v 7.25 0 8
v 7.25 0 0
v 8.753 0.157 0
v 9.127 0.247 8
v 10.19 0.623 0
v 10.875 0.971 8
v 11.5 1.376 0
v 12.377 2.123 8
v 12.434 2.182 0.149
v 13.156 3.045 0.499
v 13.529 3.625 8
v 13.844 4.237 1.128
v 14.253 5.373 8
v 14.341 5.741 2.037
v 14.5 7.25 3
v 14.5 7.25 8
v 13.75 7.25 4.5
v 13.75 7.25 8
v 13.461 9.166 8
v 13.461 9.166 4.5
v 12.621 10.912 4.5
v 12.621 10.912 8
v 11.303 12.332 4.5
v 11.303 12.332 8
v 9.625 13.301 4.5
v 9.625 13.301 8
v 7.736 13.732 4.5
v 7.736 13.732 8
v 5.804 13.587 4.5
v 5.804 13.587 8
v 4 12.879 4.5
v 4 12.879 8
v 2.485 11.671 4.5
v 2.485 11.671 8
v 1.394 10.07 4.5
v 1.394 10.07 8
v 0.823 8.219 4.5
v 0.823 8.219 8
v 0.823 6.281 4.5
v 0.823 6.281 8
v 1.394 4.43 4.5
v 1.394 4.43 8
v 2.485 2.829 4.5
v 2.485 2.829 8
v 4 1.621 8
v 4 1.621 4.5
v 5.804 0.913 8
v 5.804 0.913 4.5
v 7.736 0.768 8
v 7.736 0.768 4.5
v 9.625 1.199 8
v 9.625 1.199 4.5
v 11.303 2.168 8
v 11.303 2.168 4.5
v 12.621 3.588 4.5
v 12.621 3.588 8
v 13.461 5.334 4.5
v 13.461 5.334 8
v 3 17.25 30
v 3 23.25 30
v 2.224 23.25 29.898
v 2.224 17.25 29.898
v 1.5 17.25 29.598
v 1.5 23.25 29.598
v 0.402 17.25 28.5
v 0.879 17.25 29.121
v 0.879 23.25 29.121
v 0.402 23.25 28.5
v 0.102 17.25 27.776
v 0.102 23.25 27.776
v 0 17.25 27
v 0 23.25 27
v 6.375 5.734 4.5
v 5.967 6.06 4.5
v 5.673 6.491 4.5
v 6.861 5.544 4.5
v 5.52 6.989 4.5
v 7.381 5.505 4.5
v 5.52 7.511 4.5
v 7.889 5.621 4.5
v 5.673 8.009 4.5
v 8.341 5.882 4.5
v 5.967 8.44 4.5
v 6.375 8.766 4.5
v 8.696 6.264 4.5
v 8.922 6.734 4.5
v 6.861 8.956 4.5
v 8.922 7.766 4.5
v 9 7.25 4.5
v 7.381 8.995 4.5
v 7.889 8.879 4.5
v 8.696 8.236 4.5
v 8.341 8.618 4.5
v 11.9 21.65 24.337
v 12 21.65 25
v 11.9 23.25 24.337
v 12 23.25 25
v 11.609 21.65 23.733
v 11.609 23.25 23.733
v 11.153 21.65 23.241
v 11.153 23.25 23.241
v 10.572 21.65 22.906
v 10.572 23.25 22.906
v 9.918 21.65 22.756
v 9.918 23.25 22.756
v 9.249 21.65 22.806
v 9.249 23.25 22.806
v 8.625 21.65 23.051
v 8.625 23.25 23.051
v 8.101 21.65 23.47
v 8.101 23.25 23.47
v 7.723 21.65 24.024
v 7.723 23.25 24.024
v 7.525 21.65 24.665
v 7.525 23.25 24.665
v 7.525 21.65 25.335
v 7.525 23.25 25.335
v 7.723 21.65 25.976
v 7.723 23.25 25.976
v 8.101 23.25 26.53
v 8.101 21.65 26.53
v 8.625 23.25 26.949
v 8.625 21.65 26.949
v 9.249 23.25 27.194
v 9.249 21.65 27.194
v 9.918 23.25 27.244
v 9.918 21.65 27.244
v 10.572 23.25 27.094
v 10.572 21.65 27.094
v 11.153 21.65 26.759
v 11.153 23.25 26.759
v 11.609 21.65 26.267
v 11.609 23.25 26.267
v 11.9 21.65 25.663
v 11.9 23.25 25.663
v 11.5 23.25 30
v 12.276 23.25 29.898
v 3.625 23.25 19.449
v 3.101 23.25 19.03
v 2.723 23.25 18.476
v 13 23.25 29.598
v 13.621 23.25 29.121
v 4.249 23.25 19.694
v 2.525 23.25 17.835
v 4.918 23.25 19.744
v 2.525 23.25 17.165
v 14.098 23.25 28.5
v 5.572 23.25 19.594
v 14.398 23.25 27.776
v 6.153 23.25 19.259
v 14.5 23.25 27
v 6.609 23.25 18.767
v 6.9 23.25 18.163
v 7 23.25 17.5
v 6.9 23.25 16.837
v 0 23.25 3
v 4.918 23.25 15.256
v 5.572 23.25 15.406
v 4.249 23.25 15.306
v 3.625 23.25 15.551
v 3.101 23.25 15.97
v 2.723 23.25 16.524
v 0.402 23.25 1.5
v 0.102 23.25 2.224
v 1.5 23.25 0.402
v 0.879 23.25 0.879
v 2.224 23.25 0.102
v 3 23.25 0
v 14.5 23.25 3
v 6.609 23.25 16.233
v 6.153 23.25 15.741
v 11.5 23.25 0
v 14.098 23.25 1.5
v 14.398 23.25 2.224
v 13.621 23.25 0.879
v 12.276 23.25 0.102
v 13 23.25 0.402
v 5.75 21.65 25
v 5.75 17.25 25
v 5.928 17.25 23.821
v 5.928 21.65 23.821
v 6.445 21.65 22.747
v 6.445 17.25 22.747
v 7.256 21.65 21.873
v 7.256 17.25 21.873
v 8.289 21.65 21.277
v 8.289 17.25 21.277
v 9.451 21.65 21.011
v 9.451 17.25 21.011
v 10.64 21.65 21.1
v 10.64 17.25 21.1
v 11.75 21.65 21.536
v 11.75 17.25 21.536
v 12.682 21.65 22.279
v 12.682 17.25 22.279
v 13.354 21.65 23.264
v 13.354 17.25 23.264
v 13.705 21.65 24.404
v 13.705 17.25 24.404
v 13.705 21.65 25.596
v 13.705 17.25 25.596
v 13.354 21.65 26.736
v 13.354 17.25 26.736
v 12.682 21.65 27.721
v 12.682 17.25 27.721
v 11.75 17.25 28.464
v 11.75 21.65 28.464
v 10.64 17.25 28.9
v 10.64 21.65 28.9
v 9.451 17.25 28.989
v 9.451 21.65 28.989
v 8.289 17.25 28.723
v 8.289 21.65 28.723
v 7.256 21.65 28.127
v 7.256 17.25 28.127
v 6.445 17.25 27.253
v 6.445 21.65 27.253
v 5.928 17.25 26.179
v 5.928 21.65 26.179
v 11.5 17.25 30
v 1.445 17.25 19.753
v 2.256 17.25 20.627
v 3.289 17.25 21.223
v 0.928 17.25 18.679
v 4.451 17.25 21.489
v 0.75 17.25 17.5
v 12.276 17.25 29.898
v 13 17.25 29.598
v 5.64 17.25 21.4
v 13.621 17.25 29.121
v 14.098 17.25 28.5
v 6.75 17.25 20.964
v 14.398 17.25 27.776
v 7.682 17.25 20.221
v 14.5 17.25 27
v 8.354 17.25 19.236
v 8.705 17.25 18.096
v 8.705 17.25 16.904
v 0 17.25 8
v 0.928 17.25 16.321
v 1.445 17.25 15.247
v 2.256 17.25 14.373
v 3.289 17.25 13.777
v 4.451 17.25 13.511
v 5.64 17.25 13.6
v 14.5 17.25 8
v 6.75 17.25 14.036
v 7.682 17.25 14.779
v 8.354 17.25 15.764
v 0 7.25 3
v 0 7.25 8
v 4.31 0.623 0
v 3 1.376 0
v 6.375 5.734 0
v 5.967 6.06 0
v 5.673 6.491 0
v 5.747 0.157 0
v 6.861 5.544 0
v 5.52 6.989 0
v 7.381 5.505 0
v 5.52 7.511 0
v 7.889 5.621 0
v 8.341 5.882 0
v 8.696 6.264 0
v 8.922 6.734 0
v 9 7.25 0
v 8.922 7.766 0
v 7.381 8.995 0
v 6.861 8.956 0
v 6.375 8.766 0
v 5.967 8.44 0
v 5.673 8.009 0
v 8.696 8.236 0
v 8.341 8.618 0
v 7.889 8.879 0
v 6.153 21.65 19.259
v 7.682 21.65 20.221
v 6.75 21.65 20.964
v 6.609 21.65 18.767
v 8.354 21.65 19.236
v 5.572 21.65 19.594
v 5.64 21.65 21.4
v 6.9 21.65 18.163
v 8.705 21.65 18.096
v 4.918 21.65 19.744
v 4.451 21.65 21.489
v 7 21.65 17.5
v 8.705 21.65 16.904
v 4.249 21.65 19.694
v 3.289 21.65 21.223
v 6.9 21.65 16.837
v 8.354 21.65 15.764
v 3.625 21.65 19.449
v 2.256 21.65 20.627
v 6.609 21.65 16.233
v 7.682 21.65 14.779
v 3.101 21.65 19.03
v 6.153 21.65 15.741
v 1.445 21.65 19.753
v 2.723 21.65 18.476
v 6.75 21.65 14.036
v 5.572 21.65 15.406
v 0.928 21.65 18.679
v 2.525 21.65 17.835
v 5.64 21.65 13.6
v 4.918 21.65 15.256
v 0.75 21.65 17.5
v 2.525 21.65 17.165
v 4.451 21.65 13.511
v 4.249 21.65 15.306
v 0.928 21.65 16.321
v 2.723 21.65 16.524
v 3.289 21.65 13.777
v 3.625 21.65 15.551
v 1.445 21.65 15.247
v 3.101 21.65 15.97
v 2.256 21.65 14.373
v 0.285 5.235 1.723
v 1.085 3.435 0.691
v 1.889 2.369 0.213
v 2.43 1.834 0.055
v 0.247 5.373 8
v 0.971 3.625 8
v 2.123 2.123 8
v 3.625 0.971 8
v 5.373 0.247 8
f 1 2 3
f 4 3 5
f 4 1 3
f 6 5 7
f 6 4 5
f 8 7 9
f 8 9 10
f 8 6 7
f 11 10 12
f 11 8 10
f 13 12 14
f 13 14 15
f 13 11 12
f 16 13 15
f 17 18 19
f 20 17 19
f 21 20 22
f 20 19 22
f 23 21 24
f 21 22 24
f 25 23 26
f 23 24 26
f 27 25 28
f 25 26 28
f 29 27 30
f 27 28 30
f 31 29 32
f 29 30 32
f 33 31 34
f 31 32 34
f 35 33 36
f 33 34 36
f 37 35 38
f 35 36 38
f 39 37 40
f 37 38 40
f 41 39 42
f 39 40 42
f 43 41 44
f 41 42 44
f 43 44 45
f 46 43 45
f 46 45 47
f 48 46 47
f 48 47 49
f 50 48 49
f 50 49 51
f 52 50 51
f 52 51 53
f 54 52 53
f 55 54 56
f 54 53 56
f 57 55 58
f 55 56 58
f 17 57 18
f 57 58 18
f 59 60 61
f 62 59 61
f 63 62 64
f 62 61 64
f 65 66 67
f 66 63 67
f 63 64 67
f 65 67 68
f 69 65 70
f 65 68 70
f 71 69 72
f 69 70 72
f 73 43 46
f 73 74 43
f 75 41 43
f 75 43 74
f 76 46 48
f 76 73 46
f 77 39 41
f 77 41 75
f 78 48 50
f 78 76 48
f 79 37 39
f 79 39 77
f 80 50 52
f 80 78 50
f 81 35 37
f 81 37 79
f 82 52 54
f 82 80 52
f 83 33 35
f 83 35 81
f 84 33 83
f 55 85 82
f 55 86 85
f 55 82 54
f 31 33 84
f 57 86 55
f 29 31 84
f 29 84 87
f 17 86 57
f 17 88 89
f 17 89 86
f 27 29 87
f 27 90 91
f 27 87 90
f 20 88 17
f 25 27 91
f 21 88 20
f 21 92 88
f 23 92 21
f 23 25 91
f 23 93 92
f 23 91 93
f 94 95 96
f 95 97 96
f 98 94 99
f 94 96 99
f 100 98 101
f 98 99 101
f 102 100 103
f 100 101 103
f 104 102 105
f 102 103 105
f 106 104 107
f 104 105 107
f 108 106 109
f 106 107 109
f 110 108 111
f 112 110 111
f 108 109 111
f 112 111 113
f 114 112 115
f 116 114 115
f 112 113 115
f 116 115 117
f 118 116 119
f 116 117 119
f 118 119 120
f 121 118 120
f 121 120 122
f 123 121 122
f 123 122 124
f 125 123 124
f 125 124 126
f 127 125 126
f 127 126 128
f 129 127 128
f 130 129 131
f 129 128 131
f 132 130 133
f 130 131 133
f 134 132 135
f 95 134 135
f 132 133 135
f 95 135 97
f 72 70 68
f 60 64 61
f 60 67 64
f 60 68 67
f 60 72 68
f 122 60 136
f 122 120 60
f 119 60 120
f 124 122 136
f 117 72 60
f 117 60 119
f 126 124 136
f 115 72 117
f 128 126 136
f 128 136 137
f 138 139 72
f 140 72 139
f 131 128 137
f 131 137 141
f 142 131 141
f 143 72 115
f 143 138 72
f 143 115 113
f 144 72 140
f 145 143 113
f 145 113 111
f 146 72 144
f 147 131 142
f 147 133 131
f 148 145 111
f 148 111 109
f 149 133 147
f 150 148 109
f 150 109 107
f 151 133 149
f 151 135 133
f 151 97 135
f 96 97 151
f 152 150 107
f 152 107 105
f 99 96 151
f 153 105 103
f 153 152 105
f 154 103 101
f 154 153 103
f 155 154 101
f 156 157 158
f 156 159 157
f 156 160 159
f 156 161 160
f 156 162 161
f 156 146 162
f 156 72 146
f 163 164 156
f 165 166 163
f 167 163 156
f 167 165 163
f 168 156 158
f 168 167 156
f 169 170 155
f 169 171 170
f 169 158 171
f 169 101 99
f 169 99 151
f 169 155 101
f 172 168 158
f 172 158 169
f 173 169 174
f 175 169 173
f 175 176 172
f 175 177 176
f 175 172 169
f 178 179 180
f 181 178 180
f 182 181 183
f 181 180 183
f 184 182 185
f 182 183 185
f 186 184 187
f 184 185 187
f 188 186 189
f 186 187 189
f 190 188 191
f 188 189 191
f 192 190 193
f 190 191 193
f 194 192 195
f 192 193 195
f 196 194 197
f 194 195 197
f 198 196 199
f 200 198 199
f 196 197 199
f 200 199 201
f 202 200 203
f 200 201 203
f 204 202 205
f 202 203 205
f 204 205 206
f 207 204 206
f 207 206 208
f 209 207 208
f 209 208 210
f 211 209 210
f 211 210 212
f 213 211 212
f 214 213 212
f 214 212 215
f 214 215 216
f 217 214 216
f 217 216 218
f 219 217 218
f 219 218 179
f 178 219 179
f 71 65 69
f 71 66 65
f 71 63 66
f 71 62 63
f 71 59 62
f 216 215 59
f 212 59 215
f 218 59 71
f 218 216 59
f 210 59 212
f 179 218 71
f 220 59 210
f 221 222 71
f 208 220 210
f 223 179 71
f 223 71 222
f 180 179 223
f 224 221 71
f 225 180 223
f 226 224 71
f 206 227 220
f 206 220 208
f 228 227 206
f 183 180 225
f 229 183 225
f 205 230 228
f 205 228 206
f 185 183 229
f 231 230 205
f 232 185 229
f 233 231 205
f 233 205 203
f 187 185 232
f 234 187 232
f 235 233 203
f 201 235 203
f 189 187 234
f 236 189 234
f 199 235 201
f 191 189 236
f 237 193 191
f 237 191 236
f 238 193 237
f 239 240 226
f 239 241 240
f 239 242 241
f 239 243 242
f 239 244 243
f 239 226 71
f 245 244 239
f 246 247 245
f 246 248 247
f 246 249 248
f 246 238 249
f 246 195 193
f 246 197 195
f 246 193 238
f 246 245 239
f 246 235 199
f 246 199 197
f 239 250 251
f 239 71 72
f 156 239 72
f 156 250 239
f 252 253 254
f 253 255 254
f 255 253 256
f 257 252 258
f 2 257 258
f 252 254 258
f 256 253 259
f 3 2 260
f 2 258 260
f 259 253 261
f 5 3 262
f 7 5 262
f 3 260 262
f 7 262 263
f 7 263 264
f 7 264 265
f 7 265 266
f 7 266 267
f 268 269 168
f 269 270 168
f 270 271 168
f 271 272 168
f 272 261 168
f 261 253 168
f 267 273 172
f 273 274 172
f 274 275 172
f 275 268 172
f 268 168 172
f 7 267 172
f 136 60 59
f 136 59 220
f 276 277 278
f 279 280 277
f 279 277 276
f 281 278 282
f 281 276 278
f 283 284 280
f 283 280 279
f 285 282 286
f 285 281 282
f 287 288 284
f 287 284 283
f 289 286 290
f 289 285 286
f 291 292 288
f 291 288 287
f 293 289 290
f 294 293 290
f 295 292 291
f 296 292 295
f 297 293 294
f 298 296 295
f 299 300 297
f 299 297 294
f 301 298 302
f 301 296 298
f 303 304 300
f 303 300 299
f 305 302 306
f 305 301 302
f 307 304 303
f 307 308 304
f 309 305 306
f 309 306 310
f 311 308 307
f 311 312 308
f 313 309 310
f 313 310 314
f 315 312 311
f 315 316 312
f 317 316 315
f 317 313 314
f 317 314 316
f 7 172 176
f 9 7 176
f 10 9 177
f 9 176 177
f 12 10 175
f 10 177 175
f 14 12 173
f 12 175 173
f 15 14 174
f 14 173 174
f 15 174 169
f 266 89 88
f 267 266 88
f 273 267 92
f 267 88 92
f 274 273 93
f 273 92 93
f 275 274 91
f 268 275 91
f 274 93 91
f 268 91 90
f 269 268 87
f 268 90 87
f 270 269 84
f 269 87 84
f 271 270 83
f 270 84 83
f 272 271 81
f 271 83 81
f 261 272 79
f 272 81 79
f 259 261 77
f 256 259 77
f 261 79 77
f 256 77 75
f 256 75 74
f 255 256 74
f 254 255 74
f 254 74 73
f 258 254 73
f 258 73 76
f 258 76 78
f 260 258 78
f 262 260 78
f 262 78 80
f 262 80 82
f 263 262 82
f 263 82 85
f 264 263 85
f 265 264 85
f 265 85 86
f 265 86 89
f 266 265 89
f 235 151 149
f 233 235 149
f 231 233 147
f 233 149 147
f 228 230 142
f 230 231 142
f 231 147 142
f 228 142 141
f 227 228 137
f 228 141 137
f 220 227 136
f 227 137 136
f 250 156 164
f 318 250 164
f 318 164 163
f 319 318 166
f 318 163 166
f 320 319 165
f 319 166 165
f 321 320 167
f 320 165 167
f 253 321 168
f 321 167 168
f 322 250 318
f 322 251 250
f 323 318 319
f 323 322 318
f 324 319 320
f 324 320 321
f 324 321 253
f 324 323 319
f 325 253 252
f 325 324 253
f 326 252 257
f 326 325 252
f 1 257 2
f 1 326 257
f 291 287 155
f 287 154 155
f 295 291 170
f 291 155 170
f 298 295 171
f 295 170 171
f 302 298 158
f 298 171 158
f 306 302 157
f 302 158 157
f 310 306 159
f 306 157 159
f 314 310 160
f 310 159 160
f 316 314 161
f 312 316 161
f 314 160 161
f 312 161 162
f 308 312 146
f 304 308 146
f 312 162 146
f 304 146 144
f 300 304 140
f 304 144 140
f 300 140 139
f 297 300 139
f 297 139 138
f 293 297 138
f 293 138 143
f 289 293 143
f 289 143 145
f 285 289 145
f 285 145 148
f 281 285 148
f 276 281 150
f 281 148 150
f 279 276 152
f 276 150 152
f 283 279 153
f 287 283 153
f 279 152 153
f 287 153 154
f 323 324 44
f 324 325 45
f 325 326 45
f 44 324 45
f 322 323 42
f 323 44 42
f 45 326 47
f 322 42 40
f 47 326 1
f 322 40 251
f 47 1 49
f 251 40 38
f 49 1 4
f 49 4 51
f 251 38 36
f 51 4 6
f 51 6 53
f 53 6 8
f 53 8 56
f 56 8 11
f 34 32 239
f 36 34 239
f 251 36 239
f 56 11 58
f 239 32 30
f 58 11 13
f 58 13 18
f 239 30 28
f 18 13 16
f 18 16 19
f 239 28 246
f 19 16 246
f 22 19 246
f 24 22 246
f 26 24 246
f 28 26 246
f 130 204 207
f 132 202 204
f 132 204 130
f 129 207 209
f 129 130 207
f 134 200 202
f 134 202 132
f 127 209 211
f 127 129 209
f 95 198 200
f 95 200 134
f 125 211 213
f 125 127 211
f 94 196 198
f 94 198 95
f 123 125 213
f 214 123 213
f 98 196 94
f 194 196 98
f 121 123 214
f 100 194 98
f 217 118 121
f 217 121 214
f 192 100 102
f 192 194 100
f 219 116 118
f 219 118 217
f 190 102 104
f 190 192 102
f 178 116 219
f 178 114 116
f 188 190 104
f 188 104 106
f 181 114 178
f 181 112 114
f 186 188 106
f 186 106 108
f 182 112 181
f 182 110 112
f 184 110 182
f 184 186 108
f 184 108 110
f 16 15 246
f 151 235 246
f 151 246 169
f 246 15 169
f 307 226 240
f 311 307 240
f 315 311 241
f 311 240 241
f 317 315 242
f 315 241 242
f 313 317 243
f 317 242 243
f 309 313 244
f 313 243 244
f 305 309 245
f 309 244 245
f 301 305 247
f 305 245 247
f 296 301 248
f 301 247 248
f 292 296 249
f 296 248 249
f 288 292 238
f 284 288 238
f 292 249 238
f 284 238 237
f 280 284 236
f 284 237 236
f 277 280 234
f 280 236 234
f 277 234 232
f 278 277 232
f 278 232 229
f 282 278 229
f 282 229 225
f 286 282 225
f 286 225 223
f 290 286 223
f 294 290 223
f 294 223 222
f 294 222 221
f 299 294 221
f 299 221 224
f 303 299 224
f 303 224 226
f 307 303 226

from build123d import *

# Parameters (mm, degrees)
SKIZZE1_W                                            = 14.5
SKIZZE1_H                                            = 23.25
AUFSATZ_LINEAR_AUSTRAGEN1_DEPTH                      = 30
SKIZZE5_W                                            = 22
SKIZZE5_H                                            = 17.25
SCHNITT_LINEAR_AUSTRAGEN3_DEPTH                      = 41.630191976
VERRUNDUNG1_R                                        = 7.25
STIRNSENKUNG_F_R_M4_ZYLINDERSCHRAUBE_MIT_D           = 4.5
STIRNSENKUNG_F_R_M4_ZYLINDERSCHRAUBE_MIT_CBORE_D     = 8
STIRNSENKUNG_F_R_M4_ZYLINDERSCHRAUBE_MIT_CBORE_DEPTH = 4.4
SKIZZE9_R                                            = 6.5
SCHNITT_LINEAR_AUSTRAGEN4_DEPTH                      = 3.5
SKIZZE10_R                                           = 1.75
SCHNITT_LINEAR_AUSTRAGEN5_DEPTH                      = 5.5
SKIZZE11_OUTSIDE_W                                   = 24.626
SKIZZE11_OUTSIDE_H                                   = 40.126
SCHNITT_LINEAR_AUSTRAGEN6_DEPTH                      = 41.630191976


with BuildPart() as part:
    # Skizze1 → Aufsatz-Linear austragen1 (new body)
    with BuildSketch(Plane.XY):
        with Locations((7.25, 11.625)):
            Rectangle(SKIZZE1_W, SKIZZE1_H)
    extrude(amount=AUFSATZ_LINEAR_AUSTRAGEN1_DEPTH)

    # Skizze5 → Schnitt-Linear austragen3 (cut, through all)
    with BuildSketch(Plane(origin=(14.5, 0, 0), x_dir=(0, 0, -1), z_dir=(1, 0, 0))):
        with Locations((-19, 8.625)):
            Rectangle(SKIZZE5_W, SKIZZE5_H)
    extrude(amount=-SCHNITT_LINEAR_AUSTRAGEN3_DEPTH, mode=Mode.SUBTRACT)

    # Verrundung1
    verrundung1_edges = [part.edges().sort_by_distance(p)[0] for p in [
        (14.5, 0, 4),
        (0, 0, 4),
    ]]
    fillet(verrundung1_edges, radius=VERRUNDUNG1_R - 0.0001)  # a hair under: the kernel refuses the full size

    # Stirnsenkung für M4 Zylinderschraube mit Innensechskant1 (through all)
    with Locations(Plane(origin=(0, 17.25, 0), x_dir=(-1, 0, 0), z_dir=(0, -1, 0))):
        with Locations((-4.75, -17.5), (-9.75, -25)):
            CounterBoreHole(STIRNSENKUNG_F_R_M4_ZYLINDERSCHRAUBE_MIT_D / 2, STIRNSENKUNG_F_R_M4_ZYLINDERSCHRAUBE_MIT_CBORE_D / 2, STIRNSENKUNG_F_R_M4_ZYLINDERSCHRAUBE_MIT_CBORE_DEPTH)

    # Skizze9 → Schnitt-Linear austragen4 (cut)
    with BuildSketch(Plane.XY.offset(8)):
        with Locations((7.25, 7.25)):
            Circle(SKIZZE9_R)
    extrude(amount=-SCHNITT_LINEAR_AUSTRAGEN4_DEPTH, mode=Mode.SUBTRACT)

    # Skizze10 → Schnitt-Linear austragen5 (cut)
    with BuildSketch(Plane.XY.offset(4.5)):
        with Locations((7.25, 7.25)):
            Circle(SKIZZE10_R)
    extrude(amount=-SCHNITT_LINEAR_AUSTRAGEN5_DEPTH, mode=Mode.SUBTRACT)

    # Skizze11 outside → Schnitt-Linear austragen6 (cut, through all)
    with BuildSketch(Plane(origin=(0, 23.25, 0), x_dir=(1, 0, 0), z_dir=(0, 1, 0))):
        with Locations((7.25, -15)):
            Rectangle(SKIZZE11_OUTSIDE_W, SKIZZE11_OUTSIDE_H)
        with BuildLine():
            Line((3, 0), (11.5, 0))
            ThreePointArc((11.5, 0), (13.621320344, -0.878679656), (14.5, -3))
            Line((14.5, -3), (14.5, -27))
            ThreePointArc((14.5, -27), (13.621320344, -29.121320344), (11.5, -30))
            Line((11.5, -30), (3, -30))
            ThreePointArc((3, -30), (0.878679656, -29.121320344), (0, -27))
            Line((0, -27), (0, -3))
            ThreePointArc((0, -3), (0.878679656, -0.878679656), (3, 0))
        make_face(mode=Mode.SUBTRACT)
    extrude(amount=-SCHNITT_LINEAR_AUSTRAGEN6_DEPTH, mode=Mode.SUBTRACT)


solid = part.part
